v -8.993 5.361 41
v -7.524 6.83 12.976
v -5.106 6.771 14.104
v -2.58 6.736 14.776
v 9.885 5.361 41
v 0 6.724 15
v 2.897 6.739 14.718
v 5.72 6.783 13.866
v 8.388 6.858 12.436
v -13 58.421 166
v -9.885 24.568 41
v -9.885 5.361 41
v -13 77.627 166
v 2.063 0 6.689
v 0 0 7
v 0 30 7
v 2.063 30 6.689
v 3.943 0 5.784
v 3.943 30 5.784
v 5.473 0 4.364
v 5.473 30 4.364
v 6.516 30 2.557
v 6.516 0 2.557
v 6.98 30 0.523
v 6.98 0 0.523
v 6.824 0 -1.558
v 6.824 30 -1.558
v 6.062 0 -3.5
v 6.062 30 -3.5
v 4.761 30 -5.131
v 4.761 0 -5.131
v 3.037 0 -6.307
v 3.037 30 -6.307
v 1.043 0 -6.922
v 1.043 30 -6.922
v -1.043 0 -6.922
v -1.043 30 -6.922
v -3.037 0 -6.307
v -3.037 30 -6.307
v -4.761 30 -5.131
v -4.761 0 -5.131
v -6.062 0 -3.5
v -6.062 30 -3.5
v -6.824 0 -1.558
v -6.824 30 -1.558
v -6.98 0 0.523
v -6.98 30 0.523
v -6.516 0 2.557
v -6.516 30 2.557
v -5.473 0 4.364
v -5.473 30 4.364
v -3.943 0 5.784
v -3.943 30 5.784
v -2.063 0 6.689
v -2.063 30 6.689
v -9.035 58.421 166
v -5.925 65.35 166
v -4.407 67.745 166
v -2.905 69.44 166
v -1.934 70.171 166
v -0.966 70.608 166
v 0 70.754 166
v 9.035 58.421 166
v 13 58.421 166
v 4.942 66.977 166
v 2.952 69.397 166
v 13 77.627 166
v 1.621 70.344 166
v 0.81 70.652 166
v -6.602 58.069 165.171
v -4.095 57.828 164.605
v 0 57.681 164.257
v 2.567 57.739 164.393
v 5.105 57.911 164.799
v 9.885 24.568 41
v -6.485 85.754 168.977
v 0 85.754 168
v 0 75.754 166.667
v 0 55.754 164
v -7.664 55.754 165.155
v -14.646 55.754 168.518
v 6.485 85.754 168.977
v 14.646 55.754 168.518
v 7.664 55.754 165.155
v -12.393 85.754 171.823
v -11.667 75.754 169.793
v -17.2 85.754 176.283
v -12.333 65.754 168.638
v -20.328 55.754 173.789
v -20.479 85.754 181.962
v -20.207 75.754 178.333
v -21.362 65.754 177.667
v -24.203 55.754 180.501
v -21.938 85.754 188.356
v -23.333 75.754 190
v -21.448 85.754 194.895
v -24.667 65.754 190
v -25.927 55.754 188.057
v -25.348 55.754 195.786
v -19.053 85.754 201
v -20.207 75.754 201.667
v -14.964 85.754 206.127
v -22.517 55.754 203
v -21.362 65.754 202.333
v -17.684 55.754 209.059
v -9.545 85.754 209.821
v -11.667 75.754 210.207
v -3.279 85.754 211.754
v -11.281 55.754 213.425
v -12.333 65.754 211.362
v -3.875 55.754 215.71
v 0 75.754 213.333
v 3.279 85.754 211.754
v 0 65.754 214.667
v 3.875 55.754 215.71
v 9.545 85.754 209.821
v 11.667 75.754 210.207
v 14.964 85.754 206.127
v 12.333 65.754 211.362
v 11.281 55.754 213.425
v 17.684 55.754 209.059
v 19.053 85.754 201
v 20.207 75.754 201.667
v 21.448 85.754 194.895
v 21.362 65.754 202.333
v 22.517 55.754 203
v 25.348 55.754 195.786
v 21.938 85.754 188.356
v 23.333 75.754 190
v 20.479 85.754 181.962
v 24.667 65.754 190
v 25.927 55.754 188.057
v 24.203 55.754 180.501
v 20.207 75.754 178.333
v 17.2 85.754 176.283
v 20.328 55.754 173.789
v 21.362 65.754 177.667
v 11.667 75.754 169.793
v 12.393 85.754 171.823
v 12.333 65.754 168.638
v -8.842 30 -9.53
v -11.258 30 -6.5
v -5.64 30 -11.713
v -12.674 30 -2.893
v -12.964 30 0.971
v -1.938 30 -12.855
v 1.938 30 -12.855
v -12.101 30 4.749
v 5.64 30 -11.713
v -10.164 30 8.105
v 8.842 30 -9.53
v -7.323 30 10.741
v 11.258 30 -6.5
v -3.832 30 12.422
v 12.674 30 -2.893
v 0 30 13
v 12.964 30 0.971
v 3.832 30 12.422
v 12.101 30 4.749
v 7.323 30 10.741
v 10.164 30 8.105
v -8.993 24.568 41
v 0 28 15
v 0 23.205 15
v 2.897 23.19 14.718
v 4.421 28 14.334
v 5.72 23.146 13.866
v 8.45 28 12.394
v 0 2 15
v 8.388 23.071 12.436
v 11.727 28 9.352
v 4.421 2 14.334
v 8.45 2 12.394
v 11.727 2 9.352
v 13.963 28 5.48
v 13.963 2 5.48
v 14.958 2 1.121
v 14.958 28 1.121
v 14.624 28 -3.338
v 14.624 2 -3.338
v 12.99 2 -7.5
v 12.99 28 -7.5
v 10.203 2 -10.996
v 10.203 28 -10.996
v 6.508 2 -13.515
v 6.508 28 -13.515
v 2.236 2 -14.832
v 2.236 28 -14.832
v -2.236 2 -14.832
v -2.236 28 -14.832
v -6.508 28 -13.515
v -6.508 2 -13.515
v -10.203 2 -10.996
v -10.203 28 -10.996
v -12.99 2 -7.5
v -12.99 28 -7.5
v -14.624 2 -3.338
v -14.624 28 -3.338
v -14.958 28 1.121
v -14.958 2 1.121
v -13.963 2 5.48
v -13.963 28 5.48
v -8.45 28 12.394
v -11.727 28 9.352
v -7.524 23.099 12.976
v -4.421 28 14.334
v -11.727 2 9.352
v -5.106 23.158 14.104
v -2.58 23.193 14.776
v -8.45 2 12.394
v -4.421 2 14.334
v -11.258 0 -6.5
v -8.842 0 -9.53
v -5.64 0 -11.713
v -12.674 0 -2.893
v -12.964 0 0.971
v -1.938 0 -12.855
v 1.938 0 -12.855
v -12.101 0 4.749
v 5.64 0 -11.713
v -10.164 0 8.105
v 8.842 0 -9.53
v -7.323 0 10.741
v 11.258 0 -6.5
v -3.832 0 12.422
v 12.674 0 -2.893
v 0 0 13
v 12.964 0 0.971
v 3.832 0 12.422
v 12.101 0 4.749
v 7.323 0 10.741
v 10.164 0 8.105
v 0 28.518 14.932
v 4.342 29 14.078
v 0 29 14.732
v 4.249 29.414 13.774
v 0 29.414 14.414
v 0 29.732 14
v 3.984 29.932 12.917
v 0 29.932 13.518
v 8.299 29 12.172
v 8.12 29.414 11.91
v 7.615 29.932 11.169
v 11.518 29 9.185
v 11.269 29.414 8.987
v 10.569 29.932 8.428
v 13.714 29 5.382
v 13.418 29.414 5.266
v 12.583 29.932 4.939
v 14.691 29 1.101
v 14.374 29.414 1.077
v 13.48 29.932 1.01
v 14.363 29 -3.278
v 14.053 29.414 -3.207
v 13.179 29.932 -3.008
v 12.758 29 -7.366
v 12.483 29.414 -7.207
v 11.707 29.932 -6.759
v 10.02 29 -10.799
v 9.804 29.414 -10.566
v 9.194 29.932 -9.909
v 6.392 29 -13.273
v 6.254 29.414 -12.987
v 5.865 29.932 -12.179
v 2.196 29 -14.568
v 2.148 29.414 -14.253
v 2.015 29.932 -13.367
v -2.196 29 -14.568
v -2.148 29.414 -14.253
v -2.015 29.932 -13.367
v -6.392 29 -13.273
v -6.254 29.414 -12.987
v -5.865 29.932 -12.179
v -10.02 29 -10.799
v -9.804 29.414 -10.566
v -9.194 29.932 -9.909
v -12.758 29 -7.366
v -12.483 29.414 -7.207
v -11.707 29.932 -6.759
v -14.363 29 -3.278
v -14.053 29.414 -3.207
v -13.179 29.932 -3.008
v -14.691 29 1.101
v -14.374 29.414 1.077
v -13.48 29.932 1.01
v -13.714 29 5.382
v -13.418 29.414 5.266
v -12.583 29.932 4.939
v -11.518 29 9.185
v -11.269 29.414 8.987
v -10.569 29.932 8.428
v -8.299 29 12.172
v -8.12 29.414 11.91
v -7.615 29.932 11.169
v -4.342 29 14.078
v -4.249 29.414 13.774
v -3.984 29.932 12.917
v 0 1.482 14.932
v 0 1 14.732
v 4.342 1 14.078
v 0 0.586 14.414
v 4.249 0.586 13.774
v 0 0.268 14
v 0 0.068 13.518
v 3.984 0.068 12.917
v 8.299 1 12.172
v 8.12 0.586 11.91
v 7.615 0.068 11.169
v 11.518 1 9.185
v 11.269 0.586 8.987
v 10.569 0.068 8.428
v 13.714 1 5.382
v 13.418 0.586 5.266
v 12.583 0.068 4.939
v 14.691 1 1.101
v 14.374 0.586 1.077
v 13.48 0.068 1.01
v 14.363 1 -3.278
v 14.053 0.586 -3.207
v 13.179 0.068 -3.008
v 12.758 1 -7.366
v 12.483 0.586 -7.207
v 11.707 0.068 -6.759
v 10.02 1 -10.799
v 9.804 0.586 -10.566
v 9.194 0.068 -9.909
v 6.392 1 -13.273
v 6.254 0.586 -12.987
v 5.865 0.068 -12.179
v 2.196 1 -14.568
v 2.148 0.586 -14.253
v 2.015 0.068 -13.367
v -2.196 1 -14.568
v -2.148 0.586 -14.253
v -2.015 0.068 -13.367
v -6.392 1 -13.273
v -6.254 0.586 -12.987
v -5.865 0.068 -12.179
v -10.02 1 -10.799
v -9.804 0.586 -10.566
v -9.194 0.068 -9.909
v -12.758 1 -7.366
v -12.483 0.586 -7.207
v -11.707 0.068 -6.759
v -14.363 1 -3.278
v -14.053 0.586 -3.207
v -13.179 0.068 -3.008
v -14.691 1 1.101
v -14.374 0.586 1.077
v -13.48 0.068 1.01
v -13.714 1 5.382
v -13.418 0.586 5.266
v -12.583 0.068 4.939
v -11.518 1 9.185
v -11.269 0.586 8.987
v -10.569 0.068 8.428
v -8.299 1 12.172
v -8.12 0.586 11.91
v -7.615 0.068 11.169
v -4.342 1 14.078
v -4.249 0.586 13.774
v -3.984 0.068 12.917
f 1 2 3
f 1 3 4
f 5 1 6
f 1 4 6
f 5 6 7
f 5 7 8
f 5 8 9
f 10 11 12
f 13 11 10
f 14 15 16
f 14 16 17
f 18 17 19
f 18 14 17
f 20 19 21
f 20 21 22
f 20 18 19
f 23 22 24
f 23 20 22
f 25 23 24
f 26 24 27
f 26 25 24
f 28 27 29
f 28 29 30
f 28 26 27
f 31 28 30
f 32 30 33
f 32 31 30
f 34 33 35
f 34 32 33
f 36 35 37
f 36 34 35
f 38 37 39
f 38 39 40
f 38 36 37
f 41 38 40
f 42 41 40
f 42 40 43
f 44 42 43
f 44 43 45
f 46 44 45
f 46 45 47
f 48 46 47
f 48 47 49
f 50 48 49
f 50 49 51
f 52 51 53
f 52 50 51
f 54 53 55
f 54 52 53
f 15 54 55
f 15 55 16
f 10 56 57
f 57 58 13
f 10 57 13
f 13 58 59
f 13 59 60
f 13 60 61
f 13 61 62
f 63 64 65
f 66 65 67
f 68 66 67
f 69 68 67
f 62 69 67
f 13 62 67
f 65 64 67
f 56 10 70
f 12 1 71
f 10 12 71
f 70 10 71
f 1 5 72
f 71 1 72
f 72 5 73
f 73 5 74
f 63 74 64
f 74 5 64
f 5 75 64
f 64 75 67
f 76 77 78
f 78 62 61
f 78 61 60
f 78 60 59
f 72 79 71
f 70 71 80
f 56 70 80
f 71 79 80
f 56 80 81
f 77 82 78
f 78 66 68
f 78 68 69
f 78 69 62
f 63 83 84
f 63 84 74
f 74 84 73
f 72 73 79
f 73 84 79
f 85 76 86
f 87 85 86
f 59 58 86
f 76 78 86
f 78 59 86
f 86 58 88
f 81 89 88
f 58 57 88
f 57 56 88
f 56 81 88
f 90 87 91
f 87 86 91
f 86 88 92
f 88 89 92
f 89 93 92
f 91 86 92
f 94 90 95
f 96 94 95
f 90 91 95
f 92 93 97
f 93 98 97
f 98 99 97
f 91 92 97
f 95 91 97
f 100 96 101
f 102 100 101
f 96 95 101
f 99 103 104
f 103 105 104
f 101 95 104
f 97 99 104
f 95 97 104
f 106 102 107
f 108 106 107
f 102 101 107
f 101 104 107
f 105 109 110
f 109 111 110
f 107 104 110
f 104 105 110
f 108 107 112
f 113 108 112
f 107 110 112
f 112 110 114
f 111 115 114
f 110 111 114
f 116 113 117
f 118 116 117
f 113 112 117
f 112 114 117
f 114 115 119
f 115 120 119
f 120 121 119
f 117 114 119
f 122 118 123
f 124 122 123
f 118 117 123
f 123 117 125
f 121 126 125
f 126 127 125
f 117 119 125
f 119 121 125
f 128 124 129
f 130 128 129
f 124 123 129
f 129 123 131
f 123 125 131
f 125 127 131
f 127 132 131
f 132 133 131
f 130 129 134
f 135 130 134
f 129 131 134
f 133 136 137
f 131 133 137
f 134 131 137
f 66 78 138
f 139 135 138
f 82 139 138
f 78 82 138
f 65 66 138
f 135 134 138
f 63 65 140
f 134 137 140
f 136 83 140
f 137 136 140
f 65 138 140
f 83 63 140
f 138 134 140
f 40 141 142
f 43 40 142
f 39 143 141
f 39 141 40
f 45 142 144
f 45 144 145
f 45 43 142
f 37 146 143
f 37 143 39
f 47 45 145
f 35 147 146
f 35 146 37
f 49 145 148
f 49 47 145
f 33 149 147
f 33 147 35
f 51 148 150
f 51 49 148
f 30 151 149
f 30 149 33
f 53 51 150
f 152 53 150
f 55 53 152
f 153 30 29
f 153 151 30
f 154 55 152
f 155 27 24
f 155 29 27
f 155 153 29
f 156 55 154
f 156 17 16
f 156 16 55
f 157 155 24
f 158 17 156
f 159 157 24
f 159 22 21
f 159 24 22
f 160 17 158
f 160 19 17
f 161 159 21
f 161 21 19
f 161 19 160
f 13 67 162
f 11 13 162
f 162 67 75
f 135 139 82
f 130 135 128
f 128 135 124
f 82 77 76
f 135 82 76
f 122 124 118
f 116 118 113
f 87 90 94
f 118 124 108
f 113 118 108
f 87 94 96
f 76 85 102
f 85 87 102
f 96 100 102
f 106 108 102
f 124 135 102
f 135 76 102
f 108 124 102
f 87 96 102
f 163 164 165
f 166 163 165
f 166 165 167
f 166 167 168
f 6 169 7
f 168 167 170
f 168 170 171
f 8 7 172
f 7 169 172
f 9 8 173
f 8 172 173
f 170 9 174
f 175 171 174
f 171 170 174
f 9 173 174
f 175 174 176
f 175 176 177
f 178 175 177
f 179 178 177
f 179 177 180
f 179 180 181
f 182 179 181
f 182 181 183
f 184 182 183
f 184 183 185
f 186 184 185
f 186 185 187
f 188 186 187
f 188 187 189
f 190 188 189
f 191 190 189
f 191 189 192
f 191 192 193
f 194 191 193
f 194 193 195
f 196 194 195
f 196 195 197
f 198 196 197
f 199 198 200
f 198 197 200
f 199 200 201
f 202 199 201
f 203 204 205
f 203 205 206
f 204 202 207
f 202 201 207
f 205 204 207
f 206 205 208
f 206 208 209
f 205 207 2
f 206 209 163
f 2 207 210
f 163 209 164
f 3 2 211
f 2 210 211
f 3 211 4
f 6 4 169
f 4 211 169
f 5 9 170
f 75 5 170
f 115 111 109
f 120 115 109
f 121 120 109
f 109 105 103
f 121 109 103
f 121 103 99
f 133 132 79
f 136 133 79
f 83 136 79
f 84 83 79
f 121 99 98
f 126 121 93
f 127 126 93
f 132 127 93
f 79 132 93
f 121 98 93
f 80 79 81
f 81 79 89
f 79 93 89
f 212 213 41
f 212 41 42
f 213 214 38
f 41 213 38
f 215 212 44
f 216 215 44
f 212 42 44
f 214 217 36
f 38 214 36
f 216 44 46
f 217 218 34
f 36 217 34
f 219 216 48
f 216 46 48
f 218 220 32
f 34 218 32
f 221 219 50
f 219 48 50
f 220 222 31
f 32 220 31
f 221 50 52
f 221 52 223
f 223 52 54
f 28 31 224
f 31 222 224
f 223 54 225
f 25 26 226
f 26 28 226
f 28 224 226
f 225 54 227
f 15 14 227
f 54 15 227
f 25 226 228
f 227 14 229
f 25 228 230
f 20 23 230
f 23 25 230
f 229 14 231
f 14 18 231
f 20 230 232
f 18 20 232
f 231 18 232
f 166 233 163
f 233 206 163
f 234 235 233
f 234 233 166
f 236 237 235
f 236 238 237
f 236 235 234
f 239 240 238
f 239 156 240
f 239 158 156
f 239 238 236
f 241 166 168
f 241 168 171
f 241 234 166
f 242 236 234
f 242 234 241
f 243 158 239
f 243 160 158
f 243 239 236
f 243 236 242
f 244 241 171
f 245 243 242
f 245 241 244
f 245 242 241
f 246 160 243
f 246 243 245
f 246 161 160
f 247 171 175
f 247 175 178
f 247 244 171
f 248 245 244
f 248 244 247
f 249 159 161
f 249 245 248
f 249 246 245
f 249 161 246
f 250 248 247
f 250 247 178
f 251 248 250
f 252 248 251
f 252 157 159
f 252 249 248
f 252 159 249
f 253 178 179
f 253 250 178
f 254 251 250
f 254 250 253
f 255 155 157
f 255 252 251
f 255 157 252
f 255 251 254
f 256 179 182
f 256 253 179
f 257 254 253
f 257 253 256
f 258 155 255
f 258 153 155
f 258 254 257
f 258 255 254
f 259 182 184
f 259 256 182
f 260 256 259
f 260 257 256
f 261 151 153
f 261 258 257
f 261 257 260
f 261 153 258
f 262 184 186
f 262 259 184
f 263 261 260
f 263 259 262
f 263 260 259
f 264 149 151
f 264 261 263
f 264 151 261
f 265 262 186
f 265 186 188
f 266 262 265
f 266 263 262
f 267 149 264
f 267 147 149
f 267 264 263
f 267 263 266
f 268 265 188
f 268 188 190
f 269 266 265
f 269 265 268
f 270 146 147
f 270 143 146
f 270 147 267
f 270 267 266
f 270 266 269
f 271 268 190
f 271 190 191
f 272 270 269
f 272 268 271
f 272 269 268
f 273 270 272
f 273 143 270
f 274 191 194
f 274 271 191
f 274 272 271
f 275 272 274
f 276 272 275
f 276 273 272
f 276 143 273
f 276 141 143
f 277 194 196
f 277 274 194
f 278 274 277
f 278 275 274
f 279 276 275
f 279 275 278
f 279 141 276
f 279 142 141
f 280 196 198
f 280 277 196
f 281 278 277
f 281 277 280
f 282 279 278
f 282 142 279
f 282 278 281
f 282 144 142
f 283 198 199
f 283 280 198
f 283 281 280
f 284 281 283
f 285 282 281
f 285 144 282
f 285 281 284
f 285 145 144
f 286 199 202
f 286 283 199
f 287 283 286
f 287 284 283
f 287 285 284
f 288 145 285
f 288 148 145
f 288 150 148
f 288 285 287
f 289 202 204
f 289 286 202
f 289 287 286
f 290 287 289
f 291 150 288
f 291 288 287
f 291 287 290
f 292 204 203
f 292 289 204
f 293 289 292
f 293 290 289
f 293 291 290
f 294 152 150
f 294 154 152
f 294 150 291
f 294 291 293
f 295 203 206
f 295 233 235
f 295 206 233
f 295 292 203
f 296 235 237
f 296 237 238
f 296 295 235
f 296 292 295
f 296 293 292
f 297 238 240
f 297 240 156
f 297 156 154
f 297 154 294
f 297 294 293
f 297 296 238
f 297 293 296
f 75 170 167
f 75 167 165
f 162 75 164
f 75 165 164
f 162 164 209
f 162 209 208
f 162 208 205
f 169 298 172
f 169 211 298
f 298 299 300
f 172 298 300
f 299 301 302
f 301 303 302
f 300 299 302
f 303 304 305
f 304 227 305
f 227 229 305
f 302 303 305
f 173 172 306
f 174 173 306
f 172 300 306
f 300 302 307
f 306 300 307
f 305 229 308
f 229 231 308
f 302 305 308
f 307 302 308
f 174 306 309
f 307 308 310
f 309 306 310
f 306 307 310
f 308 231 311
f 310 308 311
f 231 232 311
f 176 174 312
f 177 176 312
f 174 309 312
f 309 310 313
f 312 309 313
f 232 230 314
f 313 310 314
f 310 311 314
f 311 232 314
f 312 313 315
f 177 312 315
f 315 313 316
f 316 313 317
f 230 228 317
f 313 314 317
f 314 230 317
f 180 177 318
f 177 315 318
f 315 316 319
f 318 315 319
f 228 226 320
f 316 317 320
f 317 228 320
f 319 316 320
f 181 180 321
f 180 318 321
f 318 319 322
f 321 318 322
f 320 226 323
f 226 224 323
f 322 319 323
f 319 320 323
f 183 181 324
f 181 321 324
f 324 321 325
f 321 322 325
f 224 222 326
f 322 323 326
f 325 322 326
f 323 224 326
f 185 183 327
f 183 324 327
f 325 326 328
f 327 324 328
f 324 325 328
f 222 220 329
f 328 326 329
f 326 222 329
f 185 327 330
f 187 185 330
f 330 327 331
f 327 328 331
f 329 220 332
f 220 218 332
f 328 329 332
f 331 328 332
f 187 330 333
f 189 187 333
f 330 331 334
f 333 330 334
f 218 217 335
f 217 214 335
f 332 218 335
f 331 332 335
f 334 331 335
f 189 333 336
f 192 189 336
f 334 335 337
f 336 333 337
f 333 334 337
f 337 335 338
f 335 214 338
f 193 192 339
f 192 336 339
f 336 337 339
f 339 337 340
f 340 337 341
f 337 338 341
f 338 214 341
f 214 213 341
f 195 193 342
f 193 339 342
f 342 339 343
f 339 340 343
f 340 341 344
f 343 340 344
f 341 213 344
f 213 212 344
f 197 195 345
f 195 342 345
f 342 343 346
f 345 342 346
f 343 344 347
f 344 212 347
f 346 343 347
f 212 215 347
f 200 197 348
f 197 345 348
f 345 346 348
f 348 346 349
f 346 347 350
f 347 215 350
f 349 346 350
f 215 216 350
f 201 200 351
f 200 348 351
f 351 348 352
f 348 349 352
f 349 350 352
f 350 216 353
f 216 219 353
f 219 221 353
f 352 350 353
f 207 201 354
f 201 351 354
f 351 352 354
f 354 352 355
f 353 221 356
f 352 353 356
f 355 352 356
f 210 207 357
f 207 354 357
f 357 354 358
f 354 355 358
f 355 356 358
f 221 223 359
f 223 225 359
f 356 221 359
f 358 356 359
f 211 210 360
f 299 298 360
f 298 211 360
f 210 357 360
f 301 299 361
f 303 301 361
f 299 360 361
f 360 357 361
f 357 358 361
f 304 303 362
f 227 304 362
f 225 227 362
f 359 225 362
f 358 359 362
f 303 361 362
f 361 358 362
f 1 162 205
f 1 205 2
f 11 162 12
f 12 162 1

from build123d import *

# Parameters (mm, degrees)
CROQUIS4_R                        = 15
CROQUIS4_R_2                      = 7
SALIENTE_EXTRUIR1_DEPTH           = 30
REDONDEO1_R                       = 2
CROQUIS8_W                        = 16.152237462
CROQUIS8_H                        = 16.481036189
SALIENTE_EXTRUIR2_DEPTH           = 26
SALIENTE_EXTRUIR2_TAPER           = -3
SALIENTE_EXTRUIR2_OTHER_WAY_DEPTH = 5
SALIENTE_EXTRUIR2_OTHER_WAY_TAPER = 3
SALIENTE_EXTRUIR4_DEPTH           = 21.4
CORTAR_EXTRUIR2_DEPTH             = 100.8


with BuildPart() as part:
    # Croquis4 → Saliente-Extruir1 (new body)
    with BuildSketch(Plane(origin=(0, 0, 0), x_dir=(1, 0, 0), z_dir=(0, 1, 0))):
        Circle(CROQUIS4_R)
        Circle(CROQUIS4_R_2, mode=Mode.SUBTRACT)
    extrude(amount=SALIENTE_EXTRUIR1_DEPTH)

    # Redondeo1
    redondeo1_edges = [part.edges().sort_by_distance(p)[0] for p in [
        (-15, 0, 0),
        (-15, 30, 0),
    ]]
    fillet(redondeo1_edges, radius=REDONDEO1_R)

    # Croquis8 → Saliente-Extruir2 (add)
    with BuildSketch(Plane.XY.offset(15)):
        with Locations((0.446006576, 14.964559515)):
            Rectangle(CROQUIS8_W, CROQUIS8_H)
    extrude(amount=SALIENTE_EXTRUIR2_DEPTH, taper=SALIENTE_EXTRUIR2_TAPER)

    # Croquis8 → Saliente-Extruir2 other way (add)
    with BuildSketch(Plane.XY.offset(15)):
        with Locations((0.446006576, 14.964559515)):
            Rectangle(CROQUIS8_W, CROQUIS8_H)
    extrude(amount=-SALIENTE_EXTRUIR2_OTHER_WAY_DEPTH, taper=SALIENTE_EXTRUIR2_OTHER_WAY_TAPER)

    # Croquis9 → Saliente-Extruir4 (add, symmetric)
    with BuildSketch(Plane(origin=(0, 0, 0), x_dir=(0, 0, -1), z_dir=(1, 0, 0))):
        Polygon((-41, 24.567679871), (-41, 5.361439159), (-166, 58.420791186), (-166, 77.627031898), align=None)
    extrude(amount=SALIENTE_EXTRUIR4_DEPTH, both=True)

    # Croquis12 → Cortar-Extruir2 (cut, symmetric)
    with BuildSketch(Plane(origin=(0, 50, 0), x_dir=(1, 0, 0), z_dir=(0, 1, 0))):
        Polygon((9.884727568, -41), (13, -166), (33.350069365, -166), (33.350069365, -41), align=None)
    cortar_extruir2 = extrude(amount=CORTAR_EXTRUIR2_DEPTH, both=True, mode=Mode.SUBTRACT)

    # Simetría3: Cortar-Extruir2 across plane
    add(cortar_extruir2.mirror(Plane(origin=(0, 0, 0), x_dir=(0, 0, 1), z_dir=(1, 0, 0))), mode=Mode.SUBTRACT)

    # Croquis14 → Revolución1 (revolve)
    with BuildSketch(Plane(origin=(0, 0, 0), x_dir=(0, 0, -1), z_dir=(1, 0, 0))):
        Polygon((-190, 85.754128646), (-212, 85.754128646), (-216, 55.754128646), (-190, 55.754128646), align=None)
    revolve(axis=Axis((0, 79.990867655, 190), (0, 1, 0)))


solid = part.part
